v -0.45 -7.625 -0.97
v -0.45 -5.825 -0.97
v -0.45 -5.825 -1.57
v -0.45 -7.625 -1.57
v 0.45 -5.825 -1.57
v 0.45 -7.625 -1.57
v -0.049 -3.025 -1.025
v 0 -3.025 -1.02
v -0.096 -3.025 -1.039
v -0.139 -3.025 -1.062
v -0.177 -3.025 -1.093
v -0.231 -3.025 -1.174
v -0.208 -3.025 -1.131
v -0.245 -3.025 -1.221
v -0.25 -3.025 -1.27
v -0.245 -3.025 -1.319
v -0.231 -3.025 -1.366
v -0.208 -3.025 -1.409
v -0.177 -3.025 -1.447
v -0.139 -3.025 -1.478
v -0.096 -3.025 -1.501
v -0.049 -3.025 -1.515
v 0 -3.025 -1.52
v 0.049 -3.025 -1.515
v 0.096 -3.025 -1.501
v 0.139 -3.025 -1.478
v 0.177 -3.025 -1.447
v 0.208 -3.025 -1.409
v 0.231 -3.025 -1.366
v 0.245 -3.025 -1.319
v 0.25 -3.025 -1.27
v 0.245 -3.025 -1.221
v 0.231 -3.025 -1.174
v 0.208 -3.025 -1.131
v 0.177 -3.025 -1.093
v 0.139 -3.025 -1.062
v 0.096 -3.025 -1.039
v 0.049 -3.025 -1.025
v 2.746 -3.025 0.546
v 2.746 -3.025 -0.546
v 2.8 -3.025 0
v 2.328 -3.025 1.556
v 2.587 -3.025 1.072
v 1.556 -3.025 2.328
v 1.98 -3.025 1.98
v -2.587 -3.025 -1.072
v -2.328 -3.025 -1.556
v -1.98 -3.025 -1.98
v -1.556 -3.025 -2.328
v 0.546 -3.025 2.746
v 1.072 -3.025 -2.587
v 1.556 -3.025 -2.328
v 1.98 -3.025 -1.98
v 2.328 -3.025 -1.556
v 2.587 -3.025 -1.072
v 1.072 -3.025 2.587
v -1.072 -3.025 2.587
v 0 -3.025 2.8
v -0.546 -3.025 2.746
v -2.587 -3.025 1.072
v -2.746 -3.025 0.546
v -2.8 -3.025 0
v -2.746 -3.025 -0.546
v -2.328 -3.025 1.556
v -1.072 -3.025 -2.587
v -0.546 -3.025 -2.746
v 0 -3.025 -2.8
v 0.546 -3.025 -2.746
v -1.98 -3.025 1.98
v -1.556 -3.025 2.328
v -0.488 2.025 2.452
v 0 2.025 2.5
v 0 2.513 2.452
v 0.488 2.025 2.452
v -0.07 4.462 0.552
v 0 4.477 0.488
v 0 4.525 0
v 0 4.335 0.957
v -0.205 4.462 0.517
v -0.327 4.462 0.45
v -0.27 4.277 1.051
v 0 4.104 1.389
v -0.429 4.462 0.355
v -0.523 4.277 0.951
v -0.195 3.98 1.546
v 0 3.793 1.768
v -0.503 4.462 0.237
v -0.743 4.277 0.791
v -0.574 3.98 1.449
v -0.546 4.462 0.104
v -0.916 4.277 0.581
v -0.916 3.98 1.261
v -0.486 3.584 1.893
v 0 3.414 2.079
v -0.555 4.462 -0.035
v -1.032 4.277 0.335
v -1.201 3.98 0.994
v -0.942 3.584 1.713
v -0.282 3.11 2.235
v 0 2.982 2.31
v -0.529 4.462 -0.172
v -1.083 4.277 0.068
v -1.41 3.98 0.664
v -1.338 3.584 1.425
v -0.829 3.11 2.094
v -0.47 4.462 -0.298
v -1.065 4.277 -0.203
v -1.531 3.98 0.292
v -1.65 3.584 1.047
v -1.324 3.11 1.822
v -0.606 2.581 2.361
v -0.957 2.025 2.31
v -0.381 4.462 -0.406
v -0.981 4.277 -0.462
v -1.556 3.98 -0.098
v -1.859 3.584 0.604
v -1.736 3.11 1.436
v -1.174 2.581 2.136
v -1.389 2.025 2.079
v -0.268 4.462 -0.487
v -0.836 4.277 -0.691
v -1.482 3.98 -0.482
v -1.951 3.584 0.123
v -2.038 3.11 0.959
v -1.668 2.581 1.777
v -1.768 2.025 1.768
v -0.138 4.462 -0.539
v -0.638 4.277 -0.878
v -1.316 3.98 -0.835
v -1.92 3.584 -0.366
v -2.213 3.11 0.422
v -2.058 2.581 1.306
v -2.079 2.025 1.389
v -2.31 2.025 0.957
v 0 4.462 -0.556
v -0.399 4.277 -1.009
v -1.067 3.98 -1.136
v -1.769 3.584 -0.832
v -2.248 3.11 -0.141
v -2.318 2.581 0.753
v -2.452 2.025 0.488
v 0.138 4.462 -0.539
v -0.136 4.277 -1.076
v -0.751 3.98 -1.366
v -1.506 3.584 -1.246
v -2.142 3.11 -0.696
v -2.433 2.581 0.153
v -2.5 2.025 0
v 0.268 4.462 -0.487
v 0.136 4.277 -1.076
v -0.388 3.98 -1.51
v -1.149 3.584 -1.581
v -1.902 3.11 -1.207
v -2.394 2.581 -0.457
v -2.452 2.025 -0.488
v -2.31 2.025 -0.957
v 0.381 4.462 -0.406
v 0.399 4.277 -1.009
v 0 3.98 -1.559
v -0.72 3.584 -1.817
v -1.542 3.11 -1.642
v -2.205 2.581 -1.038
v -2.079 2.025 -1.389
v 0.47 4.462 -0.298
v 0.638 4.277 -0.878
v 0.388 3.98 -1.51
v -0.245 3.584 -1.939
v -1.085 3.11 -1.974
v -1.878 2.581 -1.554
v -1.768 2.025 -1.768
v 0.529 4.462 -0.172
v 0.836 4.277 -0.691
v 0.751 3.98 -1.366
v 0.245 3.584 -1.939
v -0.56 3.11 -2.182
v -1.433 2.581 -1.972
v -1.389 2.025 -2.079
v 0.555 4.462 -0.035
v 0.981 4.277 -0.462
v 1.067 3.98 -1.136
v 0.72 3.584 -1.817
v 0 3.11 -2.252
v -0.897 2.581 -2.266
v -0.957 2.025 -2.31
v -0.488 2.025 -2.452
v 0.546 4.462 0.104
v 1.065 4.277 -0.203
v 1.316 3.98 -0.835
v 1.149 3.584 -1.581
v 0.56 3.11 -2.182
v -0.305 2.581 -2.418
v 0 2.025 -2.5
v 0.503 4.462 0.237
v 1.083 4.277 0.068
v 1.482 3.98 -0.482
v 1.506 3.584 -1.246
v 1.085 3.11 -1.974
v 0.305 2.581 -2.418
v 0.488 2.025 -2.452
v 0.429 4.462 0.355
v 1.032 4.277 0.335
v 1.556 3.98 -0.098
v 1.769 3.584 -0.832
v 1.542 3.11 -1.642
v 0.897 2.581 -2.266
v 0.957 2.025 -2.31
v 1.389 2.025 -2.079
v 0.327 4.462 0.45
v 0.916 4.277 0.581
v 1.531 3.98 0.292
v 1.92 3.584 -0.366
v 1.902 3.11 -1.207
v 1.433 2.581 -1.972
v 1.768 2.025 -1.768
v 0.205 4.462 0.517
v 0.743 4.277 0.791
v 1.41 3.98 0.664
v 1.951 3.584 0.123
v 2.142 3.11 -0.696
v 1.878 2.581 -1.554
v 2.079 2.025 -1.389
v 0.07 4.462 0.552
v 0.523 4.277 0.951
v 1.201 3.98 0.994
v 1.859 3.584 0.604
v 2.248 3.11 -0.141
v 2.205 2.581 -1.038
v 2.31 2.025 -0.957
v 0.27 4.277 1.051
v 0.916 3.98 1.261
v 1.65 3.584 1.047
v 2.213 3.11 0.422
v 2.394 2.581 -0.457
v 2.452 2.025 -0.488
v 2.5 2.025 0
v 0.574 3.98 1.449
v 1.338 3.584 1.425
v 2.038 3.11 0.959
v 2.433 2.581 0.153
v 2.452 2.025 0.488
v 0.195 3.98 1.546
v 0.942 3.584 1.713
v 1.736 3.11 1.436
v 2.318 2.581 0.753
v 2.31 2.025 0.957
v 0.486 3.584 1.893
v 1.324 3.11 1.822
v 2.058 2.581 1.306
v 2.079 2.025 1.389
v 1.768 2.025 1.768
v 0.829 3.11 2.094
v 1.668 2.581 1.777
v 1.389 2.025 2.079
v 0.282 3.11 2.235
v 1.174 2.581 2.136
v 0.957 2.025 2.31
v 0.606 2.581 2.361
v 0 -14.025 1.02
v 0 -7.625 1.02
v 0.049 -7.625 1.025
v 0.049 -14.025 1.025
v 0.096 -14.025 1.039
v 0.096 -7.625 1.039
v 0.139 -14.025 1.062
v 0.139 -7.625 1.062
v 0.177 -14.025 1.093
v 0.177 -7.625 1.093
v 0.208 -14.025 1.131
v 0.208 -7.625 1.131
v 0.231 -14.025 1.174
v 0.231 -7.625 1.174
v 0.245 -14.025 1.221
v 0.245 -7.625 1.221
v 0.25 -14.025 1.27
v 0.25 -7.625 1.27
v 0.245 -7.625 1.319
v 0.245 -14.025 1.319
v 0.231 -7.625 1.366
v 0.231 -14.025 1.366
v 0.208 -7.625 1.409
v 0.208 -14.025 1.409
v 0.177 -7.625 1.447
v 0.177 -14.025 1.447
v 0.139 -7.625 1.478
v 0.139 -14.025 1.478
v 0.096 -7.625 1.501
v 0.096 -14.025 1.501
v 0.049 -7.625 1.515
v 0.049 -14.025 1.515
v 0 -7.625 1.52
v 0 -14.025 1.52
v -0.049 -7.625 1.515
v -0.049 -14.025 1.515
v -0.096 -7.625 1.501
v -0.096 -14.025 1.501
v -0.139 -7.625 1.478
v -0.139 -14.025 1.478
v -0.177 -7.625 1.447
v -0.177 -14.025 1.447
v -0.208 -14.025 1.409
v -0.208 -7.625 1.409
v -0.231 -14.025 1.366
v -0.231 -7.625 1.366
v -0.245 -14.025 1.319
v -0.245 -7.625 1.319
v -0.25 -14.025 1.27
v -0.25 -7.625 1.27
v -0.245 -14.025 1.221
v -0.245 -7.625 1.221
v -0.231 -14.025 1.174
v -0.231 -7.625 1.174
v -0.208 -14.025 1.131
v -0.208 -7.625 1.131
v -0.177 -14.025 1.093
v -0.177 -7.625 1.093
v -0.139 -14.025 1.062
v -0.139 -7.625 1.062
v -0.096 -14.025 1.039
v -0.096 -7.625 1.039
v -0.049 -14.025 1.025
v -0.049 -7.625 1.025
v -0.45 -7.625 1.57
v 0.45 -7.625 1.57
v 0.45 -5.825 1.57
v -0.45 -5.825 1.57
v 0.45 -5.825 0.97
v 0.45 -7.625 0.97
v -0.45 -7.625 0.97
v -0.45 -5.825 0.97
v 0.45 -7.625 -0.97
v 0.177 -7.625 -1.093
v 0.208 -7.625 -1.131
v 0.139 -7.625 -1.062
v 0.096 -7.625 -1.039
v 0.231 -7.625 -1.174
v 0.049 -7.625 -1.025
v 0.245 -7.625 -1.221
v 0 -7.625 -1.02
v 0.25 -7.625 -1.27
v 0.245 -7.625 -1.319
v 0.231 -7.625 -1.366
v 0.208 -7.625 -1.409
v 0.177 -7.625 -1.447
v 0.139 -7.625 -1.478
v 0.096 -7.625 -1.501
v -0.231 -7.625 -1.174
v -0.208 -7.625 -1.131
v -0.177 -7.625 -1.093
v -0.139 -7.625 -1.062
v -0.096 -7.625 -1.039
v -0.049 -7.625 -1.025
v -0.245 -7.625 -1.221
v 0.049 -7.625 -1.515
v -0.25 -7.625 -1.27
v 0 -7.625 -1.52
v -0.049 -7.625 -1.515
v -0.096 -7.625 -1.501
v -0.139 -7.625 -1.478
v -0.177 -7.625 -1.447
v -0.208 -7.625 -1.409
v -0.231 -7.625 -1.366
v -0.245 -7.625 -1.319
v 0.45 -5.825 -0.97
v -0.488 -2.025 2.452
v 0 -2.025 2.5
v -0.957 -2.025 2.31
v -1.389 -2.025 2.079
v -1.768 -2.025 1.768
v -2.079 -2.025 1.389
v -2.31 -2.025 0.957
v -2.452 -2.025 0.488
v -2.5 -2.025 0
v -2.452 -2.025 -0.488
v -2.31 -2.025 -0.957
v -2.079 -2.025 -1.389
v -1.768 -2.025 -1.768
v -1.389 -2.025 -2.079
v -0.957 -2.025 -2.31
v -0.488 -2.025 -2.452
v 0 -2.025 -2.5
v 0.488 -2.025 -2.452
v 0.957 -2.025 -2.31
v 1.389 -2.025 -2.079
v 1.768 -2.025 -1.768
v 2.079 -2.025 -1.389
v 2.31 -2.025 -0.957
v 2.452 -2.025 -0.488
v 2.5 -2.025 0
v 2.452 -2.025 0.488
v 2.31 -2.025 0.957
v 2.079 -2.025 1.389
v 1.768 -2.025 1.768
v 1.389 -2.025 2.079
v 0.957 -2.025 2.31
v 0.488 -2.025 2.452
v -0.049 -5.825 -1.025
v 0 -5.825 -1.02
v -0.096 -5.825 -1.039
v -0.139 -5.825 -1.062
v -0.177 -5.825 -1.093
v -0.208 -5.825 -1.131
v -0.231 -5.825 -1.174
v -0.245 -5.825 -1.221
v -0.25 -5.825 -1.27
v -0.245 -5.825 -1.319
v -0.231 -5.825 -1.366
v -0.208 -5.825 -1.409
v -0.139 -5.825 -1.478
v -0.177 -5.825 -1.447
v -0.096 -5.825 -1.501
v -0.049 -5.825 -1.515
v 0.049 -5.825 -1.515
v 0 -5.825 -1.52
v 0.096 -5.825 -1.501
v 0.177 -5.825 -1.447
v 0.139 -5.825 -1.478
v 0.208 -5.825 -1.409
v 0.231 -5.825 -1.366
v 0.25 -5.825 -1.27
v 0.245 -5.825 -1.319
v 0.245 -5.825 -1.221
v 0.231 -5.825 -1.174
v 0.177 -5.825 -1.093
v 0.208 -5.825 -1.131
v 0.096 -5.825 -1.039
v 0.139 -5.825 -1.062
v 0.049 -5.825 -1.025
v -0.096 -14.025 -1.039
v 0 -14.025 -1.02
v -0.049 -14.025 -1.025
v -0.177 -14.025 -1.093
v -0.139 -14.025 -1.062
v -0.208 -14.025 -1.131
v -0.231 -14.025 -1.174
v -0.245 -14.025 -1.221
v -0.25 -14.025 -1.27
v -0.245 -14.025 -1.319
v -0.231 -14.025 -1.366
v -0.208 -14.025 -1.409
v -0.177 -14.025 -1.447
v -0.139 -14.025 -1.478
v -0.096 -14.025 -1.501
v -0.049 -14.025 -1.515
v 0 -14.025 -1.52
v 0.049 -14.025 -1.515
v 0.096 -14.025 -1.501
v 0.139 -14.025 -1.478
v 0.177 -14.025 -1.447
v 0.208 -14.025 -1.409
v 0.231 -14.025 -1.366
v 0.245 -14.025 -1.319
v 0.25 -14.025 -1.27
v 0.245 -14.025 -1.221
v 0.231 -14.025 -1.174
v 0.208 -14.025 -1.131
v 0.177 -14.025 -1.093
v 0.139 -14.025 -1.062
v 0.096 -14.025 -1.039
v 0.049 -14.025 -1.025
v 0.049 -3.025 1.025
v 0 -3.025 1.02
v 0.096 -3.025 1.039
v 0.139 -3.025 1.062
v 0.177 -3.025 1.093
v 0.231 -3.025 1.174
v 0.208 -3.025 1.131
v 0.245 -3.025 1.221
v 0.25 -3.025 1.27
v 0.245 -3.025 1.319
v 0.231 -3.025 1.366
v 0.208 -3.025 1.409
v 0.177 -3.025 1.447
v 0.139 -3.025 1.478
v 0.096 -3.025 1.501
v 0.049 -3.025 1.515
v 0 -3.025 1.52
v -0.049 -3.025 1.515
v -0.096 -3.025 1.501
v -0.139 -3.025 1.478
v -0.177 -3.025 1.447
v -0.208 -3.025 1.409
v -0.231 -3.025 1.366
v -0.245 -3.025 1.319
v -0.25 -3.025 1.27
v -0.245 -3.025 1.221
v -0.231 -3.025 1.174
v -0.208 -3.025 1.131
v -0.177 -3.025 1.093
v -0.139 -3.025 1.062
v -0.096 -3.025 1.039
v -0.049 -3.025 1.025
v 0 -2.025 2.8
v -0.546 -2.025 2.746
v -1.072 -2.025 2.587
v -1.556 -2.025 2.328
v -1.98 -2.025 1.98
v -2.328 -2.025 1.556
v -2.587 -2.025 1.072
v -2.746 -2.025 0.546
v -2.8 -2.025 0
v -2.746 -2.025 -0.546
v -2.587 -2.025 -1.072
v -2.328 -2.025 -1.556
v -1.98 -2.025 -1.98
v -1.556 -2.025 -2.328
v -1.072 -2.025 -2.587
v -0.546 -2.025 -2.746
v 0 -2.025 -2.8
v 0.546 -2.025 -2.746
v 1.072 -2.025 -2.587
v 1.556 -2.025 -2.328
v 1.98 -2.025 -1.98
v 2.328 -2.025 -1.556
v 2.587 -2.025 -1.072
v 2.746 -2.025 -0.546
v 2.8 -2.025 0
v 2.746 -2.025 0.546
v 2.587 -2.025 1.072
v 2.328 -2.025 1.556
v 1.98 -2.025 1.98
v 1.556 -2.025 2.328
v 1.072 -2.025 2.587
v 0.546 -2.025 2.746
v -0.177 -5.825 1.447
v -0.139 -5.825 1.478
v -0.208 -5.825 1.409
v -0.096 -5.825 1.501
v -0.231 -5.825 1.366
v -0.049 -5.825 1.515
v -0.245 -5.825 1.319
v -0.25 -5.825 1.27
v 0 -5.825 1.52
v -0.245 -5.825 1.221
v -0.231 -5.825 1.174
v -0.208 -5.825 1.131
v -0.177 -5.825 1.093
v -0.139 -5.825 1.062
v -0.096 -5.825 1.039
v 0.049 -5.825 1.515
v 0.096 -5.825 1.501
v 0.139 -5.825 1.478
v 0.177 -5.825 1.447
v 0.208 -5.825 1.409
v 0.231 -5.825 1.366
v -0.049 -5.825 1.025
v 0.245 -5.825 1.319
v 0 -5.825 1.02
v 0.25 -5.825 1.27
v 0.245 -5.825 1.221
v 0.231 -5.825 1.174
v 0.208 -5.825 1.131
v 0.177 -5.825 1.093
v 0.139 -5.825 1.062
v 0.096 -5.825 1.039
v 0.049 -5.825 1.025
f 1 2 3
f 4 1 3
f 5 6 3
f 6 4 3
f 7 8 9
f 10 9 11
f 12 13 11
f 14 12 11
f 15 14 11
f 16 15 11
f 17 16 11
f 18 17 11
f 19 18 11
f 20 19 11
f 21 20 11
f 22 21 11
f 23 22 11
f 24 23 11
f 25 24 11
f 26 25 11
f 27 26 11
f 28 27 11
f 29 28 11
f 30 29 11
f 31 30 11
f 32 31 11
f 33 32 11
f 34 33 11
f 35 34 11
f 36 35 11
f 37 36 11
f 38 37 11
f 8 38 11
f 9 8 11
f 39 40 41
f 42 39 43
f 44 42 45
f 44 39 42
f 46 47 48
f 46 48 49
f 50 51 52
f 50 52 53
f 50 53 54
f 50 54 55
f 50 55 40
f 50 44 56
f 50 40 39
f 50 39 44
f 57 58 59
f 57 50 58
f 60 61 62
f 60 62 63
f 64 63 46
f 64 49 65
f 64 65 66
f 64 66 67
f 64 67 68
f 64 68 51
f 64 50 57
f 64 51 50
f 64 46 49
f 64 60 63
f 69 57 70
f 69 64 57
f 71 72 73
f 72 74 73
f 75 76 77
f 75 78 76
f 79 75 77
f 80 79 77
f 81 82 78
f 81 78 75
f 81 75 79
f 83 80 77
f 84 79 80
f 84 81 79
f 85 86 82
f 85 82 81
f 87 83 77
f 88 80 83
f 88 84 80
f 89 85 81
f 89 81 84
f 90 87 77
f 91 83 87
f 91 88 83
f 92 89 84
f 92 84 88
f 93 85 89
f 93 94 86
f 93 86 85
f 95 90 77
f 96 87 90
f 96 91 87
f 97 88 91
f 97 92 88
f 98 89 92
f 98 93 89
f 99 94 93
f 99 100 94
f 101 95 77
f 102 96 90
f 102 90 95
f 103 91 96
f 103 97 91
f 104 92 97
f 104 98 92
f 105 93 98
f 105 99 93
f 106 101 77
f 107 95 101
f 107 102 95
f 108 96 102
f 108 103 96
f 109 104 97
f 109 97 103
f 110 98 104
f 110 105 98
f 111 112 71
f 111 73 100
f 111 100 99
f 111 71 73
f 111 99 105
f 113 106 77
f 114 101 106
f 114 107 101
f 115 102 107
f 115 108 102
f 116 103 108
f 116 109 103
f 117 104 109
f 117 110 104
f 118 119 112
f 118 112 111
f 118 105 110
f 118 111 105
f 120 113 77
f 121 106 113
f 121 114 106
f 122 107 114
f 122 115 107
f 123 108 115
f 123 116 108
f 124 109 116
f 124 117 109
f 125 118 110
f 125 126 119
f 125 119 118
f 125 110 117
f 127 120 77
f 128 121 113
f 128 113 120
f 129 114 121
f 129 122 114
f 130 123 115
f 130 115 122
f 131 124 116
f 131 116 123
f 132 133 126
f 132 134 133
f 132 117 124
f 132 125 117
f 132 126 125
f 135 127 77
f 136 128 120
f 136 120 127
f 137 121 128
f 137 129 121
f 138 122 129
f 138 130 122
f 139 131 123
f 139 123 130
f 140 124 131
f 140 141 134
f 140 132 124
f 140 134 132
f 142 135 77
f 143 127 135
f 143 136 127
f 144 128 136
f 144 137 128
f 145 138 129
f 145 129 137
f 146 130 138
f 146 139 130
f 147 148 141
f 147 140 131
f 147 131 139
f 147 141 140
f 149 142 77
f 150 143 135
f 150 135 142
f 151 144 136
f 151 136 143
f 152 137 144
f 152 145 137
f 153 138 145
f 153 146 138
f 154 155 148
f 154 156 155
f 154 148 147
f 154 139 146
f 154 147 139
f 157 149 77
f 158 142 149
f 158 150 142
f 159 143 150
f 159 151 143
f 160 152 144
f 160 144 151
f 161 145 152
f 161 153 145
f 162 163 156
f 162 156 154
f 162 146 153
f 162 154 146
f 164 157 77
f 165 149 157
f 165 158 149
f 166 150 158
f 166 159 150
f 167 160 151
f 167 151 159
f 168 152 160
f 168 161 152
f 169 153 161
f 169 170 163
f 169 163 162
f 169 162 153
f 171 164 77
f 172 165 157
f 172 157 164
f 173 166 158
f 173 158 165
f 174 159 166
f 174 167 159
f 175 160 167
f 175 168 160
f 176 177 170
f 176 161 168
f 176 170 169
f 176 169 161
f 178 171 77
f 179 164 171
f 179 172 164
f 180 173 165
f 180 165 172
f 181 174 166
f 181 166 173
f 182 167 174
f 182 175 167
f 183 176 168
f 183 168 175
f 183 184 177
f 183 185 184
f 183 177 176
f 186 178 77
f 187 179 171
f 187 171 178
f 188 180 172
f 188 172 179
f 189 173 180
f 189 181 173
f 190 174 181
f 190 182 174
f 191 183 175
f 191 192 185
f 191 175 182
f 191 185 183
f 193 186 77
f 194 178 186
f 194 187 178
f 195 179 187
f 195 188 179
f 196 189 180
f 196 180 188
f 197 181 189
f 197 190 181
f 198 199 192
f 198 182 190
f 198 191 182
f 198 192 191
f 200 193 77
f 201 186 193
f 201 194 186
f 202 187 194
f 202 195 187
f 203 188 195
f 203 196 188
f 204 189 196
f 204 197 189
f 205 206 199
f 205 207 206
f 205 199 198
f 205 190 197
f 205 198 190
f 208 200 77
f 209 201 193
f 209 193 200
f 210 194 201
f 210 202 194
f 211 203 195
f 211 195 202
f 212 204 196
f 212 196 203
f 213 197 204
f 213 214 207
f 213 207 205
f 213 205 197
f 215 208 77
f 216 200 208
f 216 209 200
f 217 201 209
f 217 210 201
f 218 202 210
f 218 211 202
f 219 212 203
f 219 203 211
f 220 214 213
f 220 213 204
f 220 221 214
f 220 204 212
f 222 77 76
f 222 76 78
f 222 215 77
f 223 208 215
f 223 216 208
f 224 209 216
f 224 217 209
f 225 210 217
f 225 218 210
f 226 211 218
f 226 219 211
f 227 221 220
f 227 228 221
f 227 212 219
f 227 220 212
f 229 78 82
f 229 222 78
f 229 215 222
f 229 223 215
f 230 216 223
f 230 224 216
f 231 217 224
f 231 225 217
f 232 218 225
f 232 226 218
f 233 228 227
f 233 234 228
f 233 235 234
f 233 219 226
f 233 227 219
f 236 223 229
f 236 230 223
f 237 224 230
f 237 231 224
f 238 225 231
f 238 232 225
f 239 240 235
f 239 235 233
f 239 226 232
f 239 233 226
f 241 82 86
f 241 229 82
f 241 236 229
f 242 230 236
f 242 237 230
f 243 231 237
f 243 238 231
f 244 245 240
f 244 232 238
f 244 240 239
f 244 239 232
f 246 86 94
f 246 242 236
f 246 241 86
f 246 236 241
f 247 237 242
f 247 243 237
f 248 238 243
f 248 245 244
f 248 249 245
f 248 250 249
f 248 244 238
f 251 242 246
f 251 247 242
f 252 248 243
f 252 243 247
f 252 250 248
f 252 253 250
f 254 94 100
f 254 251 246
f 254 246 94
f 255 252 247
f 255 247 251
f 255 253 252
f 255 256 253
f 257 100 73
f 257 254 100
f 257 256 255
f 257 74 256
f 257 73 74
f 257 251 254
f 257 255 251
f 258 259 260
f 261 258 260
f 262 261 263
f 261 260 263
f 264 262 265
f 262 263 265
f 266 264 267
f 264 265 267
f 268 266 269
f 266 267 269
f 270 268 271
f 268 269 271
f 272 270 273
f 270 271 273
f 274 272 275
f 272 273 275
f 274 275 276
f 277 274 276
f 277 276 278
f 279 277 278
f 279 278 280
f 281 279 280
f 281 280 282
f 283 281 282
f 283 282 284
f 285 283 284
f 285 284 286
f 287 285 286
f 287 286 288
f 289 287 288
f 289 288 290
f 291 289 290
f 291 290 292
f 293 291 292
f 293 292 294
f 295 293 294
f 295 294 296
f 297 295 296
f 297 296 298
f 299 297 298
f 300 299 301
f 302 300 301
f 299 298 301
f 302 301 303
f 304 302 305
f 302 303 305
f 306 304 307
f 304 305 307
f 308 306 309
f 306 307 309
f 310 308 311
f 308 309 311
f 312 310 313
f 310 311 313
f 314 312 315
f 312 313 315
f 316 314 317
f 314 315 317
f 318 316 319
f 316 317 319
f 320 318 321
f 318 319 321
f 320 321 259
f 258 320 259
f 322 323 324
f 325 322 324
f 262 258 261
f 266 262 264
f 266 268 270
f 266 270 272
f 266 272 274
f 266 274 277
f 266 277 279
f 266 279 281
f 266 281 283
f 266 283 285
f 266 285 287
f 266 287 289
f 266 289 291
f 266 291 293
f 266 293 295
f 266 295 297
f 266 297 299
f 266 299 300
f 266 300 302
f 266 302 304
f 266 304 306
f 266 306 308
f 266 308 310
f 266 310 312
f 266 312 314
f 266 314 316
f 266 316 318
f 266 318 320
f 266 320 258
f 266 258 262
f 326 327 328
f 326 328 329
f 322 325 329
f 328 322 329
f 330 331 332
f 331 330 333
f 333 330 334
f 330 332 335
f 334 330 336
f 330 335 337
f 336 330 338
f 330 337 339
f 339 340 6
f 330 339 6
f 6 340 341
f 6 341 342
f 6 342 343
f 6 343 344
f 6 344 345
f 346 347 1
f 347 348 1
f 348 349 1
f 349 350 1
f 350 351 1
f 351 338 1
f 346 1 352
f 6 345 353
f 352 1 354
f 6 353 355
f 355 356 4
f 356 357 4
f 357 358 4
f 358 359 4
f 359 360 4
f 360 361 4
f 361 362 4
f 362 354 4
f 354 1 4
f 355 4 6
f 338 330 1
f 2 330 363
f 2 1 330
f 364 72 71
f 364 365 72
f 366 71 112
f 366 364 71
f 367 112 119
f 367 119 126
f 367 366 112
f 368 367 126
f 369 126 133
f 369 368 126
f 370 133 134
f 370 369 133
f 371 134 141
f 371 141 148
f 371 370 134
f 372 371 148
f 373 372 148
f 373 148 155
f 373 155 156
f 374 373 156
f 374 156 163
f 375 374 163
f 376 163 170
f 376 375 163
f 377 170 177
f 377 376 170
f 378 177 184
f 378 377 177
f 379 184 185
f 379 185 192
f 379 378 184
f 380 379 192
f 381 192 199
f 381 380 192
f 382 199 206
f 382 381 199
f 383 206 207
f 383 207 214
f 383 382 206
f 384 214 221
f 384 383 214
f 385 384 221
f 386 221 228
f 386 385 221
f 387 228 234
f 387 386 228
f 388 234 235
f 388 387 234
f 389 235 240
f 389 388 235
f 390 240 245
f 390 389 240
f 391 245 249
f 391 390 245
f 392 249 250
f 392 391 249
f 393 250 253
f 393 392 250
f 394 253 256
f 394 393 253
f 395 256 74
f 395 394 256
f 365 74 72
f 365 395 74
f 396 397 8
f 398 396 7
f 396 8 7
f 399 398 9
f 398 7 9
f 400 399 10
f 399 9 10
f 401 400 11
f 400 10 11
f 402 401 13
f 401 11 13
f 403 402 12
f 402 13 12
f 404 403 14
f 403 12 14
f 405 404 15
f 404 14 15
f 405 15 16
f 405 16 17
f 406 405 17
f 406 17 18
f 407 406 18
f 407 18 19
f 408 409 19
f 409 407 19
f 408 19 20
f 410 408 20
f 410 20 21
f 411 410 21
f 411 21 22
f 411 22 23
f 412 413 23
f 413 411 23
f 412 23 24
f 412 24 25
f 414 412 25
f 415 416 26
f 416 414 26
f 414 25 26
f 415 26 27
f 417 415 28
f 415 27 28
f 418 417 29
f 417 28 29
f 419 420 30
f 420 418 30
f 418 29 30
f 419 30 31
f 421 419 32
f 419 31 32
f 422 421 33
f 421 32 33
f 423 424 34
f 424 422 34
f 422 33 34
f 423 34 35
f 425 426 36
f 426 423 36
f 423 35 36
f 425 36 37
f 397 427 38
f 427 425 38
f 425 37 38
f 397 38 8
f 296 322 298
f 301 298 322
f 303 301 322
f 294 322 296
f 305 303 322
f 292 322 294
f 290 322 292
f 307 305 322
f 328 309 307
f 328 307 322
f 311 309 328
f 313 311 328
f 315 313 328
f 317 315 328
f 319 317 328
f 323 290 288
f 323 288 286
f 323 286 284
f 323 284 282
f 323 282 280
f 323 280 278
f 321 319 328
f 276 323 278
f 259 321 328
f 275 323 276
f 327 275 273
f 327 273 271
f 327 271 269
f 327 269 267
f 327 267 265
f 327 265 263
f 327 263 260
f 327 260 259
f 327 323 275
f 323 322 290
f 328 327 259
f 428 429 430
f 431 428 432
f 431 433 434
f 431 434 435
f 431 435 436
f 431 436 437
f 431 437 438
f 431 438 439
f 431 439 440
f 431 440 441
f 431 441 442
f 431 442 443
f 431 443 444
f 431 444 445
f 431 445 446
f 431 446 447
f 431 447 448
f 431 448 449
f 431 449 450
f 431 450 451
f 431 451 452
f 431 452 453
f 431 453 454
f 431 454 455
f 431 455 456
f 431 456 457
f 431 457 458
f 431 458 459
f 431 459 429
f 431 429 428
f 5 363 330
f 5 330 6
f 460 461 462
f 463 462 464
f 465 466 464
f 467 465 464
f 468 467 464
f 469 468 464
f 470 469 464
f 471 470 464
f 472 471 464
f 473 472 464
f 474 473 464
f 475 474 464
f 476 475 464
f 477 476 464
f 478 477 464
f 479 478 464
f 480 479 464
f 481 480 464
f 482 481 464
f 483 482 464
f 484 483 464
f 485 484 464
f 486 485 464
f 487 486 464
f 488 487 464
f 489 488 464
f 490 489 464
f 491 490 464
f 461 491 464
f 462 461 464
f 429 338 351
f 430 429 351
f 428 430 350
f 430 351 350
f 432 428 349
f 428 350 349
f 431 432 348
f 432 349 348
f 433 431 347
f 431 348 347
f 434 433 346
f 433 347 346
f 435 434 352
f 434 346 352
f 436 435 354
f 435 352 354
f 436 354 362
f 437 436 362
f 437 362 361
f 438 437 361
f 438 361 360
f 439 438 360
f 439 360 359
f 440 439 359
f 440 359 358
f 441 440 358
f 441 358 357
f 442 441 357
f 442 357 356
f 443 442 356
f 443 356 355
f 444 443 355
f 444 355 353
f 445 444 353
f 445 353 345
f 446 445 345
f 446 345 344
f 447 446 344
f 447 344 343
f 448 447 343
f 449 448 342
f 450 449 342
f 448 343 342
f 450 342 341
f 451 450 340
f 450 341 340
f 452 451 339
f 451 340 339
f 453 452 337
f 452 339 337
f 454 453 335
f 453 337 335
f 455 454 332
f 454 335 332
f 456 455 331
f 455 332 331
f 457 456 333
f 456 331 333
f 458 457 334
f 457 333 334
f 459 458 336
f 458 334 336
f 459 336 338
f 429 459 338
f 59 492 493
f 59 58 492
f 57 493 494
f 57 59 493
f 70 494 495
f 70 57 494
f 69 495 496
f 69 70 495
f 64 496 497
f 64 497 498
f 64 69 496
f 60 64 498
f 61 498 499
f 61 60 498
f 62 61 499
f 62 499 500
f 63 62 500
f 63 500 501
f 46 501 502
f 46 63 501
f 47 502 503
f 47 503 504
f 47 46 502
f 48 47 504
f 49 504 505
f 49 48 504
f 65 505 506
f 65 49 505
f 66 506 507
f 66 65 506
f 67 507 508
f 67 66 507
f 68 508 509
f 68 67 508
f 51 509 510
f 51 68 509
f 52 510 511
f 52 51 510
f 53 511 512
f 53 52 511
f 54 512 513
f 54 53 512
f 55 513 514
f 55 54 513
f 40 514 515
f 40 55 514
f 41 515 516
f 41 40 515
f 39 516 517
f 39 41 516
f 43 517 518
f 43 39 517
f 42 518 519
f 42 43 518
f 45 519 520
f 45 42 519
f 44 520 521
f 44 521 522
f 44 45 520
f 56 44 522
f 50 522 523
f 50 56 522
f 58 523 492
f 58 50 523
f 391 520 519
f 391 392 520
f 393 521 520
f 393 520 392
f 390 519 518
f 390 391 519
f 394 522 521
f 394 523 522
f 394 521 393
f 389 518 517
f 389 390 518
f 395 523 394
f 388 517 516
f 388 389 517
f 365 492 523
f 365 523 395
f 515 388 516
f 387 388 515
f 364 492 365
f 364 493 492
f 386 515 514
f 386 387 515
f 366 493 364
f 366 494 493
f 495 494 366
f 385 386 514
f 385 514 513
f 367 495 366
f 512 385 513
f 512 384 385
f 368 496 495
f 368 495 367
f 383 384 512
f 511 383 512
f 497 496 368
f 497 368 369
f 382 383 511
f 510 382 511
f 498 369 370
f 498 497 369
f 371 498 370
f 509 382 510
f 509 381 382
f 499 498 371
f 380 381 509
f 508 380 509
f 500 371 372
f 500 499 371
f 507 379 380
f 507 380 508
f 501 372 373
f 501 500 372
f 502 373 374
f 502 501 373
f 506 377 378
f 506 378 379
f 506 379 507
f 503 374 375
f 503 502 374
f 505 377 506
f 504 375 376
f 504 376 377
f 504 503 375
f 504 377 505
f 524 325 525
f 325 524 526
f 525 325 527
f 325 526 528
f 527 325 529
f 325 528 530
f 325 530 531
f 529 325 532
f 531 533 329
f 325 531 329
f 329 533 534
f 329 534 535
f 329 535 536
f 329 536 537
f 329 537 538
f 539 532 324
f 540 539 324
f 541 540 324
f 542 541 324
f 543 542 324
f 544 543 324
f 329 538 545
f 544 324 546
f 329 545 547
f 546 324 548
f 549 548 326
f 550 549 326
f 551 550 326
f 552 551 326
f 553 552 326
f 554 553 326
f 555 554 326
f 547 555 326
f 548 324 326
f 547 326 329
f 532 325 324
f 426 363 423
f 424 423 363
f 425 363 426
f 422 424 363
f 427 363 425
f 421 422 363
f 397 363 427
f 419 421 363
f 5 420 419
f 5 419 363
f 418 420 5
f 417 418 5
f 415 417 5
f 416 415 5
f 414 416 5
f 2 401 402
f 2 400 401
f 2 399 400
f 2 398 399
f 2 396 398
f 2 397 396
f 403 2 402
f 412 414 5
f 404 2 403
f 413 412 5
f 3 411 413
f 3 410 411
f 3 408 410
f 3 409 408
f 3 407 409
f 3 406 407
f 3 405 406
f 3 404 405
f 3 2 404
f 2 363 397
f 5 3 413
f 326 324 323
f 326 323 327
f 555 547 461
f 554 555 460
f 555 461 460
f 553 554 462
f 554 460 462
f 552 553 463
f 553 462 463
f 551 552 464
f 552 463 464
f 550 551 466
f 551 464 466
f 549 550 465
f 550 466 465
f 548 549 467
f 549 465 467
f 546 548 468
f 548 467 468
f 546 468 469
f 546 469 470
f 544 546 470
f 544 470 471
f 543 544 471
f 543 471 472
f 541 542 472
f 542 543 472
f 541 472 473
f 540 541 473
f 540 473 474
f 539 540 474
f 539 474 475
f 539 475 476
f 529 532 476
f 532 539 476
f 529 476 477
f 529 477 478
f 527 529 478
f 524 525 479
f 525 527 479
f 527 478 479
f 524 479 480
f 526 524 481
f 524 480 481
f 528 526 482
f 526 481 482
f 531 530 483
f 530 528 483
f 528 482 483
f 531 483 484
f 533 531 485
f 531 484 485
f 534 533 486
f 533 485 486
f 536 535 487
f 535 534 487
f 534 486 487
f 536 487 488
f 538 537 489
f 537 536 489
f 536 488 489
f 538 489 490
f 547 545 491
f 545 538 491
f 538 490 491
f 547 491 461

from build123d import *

# Parameters (mm, degrees)
SKETCH2_R             = 0.25
BOSS_EXTRUDE1_DEPTH   = 11
BOSS_EXTRUDE1_2_DEPTH = 11
SKETCH3_W             = 0.6
SKETCH3_H             = 1.8
BOSS_EXTRUDE2_DEPTH   = 0.45


with BuildPart() as part:
    # Sketch1 → Revolve1 (revolve)
    with BuildSketch(Plane(origin=(0, 0, 0), x_dir=(0, 0, -1), z_dir=(1, 0, 0))):
        with BuildLine():
            Line((-2.5, 2.025), (-2.5, -2.025))
            Line((-2.5, -2.025), (-2.8, -2.025))
            Line((-2.8, -2.025), (-2.8, -3.025))
            Line((-2.8, -3.025), (0, -3.025))
            Line((0, -3.025), (0, 4.525))
            ThreePointArc((0, 4.525), (-1.767766953, 3.792766953), (-2.5, 2.025))
        make_face()
    revolve(axis=Axis((0, 4.525, 0), (0, -1, 0)))


with BuildPart() as body_2:
    # Sketch2 → Boss-Extrude1 (new body)
    with BuildSketch(Plane.XZ.offset(3.025)):
        with Locations(Location((0, 1.27, 0), (0, 0, 270))):
            Circle(SKETCH2_R)
    extrude(amount=BOSS_EXTRUDE1_DEPTH)



with BuildPart() as body_3:
    # Sketch2 → Boss-Extrude1 2 (new body)
    with BuildSketch(Plane.XZ.offset(3.025)):
        with Locations(Location((0, -1.27, 0), (0, 0, 90))):
            Circle(SKETCH2_R)
    extrude(amount=BOSS_EXTRUDE1_2_DEPTH)


with BuildPart() as body_2_1:
    add(body_2.part)

    add(body_3.part)  # Boss-Extrude2 merges body 3
    # Sketch3 → Boss-Extrude2 (add, symmetric)
    with BuildSketch(Plane(origin=(0, 0, 0), x_dir=(0, 0, -1), z_dir=(1, 0, 0))):
        with Locations((1.27, -6.725)):
            Rectangle(SKETCH3_W, SKETCH3_H)
        with Locations((-1.27, -6.725)):
            Rectangle(SKETCH3_W, SKETCH3_H)
    extrude(amount=BOSS_EXTRUDE2_DEPTH, both=True)


solid = Compound([part.part, body_2_1.part])
